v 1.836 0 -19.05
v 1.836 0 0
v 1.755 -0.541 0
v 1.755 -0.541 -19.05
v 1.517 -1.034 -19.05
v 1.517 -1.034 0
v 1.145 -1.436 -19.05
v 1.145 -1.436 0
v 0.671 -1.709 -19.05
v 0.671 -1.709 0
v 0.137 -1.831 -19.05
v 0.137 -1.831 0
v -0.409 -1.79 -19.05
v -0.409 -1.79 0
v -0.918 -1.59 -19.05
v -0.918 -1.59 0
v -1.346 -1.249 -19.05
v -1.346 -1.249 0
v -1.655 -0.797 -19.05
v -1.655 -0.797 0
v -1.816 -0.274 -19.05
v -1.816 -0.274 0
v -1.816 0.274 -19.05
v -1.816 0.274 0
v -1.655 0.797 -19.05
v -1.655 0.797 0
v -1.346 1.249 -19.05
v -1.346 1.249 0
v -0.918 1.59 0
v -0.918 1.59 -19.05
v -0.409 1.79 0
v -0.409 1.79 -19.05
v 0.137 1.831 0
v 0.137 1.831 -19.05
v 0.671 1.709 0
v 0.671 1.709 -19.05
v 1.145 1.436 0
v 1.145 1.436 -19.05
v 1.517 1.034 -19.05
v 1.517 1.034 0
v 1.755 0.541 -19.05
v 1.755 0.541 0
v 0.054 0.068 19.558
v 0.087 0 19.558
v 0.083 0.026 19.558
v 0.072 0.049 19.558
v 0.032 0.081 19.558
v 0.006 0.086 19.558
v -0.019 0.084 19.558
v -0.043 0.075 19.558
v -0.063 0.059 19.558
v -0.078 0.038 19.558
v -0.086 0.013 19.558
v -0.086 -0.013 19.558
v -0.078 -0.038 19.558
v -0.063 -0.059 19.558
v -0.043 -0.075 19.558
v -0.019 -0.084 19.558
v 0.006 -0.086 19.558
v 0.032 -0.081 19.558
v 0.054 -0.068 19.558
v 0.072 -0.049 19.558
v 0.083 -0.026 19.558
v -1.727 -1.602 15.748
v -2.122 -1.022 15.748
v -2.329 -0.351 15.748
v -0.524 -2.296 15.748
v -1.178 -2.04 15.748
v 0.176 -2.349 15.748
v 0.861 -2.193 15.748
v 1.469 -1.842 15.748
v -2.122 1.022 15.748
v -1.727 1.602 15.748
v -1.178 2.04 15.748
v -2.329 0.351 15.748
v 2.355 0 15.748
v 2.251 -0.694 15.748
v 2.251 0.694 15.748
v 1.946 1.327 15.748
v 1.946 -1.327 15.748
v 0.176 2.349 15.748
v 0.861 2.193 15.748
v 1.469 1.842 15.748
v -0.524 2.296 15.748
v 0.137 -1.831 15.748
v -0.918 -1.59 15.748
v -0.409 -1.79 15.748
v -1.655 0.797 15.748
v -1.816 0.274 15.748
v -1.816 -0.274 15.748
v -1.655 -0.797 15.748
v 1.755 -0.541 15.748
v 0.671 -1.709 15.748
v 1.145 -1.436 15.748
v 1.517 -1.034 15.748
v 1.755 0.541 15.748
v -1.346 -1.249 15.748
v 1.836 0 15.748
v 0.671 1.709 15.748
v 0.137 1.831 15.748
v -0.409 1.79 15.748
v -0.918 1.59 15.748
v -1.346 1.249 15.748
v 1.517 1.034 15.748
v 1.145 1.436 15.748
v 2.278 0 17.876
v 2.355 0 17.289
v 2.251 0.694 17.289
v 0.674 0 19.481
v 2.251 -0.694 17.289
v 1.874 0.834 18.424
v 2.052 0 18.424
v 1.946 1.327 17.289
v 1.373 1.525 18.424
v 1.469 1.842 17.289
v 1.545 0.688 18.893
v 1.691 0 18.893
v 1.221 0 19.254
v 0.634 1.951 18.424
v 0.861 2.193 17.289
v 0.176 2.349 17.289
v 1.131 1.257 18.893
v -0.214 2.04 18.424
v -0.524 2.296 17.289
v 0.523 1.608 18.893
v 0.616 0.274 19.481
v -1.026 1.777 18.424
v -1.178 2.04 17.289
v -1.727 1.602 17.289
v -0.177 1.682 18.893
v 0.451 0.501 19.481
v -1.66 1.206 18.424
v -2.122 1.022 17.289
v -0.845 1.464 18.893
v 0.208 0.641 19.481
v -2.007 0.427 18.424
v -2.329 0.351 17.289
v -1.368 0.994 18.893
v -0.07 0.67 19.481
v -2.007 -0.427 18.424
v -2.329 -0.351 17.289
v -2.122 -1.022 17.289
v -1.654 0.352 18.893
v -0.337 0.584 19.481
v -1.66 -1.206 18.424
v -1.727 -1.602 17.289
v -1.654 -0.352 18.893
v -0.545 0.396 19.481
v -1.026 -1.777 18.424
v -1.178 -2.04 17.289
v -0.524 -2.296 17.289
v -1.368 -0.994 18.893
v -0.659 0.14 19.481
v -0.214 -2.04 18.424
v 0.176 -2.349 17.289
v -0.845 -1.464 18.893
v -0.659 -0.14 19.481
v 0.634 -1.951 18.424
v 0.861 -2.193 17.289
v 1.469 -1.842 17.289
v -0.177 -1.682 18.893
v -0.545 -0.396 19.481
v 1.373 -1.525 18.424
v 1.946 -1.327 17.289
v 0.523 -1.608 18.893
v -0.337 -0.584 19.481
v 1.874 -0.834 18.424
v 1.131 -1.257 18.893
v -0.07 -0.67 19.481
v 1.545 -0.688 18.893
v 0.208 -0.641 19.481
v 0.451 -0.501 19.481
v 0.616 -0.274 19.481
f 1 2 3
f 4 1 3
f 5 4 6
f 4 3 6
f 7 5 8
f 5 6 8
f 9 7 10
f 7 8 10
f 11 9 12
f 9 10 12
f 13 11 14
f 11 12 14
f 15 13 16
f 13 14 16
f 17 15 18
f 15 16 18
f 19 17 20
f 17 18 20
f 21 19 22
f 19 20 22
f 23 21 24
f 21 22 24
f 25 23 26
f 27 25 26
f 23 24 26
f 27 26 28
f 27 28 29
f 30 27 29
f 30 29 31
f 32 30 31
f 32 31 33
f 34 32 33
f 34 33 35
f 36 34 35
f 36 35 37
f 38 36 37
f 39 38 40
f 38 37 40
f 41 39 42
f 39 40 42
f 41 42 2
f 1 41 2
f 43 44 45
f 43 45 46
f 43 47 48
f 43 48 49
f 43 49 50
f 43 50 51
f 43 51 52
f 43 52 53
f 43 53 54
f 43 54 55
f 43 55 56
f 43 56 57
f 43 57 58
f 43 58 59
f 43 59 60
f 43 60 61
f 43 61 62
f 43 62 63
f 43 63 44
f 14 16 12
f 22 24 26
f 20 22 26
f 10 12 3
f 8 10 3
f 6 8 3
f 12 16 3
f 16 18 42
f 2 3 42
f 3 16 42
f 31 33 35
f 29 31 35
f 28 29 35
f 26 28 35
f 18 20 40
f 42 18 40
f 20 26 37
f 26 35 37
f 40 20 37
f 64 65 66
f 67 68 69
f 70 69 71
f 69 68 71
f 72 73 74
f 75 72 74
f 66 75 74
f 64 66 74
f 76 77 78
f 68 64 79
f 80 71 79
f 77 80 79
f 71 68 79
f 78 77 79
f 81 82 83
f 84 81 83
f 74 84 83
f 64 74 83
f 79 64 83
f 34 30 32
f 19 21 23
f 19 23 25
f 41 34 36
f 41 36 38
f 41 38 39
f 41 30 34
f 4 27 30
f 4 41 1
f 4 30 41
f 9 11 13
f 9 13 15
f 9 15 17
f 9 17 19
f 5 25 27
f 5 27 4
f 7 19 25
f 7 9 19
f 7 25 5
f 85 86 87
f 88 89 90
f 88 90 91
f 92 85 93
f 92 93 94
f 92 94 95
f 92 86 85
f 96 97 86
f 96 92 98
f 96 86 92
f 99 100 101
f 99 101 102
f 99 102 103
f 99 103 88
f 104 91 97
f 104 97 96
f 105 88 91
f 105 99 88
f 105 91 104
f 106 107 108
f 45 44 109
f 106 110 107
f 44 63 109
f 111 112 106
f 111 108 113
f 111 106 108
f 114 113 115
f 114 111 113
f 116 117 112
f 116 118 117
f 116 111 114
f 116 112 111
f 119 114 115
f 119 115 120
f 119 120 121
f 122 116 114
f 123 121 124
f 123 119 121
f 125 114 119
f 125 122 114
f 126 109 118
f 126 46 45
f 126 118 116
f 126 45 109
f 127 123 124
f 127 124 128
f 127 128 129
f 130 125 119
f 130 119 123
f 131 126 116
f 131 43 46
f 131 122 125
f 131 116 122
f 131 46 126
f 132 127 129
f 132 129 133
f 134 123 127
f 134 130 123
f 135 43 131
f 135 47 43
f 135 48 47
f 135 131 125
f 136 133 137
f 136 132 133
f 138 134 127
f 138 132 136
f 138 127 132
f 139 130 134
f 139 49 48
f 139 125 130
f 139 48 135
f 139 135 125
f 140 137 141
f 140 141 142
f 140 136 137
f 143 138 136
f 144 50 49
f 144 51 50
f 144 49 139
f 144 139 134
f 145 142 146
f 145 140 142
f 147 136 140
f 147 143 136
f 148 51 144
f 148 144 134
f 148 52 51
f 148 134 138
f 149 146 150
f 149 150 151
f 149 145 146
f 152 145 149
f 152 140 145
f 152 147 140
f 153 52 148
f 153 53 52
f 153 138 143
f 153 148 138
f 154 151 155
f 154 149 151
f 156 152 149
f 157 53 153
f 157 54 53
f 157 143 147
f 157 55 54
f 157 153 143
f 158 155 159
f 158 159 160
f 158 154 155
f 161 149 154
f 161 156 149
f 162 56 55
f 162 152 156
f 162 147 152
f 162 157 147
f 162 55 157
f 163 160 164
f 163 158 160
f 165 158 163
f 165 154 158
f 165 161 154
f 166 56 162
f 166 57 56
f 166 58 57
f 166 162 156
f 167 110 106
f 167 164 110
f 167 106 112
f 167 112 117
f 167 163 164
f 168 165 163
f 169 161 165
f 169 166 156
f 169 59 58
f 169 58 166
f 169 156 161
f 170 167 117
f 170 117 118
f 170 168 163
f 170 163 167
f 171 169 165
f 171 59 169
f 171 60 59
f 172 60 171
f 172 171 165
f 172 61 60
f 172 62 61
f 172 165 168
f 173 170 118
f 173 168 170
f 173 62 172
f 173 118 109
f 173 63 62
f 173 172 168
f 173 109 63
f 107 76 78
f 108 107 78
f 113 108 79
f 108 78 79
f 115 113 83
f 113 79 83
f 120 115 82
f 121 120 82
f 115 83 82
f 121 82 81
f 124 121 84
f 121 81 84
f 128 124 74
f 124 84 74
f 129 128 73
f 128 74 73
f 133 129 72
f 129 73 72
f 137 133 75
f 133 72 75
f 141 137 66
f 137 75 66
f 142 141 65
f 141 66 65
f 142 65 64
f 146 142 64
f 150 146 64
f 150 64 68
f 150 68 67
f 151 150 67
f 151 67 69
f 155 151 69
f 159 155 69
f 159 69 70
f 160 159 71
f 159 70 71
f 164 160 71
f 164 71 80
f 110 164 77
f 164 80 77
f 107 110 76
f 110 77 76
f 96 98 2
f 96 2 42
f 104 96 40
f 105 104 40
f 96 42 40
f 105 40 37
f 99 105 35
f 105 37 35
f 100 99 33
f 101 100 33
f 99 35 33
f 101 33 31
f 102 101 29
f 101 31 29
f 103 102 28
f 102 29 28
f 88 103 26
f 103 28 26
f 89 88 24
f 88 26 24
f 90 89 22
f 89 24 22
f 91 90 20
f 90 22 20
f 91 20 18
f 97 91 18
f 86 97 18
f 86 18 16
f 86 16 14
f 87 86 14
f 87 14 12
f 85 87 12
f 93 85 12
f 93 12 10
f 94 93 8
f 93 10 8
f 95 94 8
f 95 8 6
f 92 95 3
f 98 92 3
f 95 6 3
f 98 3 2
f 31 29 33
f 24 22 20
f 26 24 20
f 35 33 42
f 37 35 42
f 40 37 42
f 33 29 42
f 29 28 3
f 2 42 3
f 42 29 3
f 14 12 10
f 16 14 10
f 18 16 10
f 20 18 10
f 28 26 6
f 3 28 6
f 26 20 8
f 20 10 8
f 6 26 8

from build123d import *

# Parameters (mm, degrees)
F0_R     = 1.8364004546
F1_DEPTH = 15.748
F2_R     = 2.355472205
F2_R_2   = 1.8364004546
F3_DEPTH = 3.81
F4_R     = 2.2688779059
F5_R     = 1.8364004546
F6_DEPTH = 19.05


with BuildPart() as f1:
    # F0 (on Top) → F1 (new body)
    with BuildSketch(Plane.XY):
        Circle(F0_R)
    extrude(amount=F1_DEPTH)


with BuildPart() as f3:
    # F2 (on face) → F3 (new body)
    with BuildSketch(Plane.XY.offset(15.748)):
        Circle(F2_R)
        Circle(F2_R_2, mode=Mode.SUBTRACT)
        Circle(F2_R_2)
    extrude(amount=F3_DEPTH)

    # F4
    f4_edges = [f3.edges().sort_by_distance(p)[0] for p in [
        (-2.355472, 0, 19.558),
    ]]
    fillet(f4_edges, radius=F4_R)


with BuildPart() as f6:
    # F5 (on face) → F6 (new body)
    with BuildSketch(Plane(origin=(0, 0, 0), x_dir=(1, 0, 0), z_dir=(0, 0, -1))):
        Circle(F5_R)
    extrude(amount=F6_DEPTH)


solid = Compound([f1.part, f3.part, f6.part])
